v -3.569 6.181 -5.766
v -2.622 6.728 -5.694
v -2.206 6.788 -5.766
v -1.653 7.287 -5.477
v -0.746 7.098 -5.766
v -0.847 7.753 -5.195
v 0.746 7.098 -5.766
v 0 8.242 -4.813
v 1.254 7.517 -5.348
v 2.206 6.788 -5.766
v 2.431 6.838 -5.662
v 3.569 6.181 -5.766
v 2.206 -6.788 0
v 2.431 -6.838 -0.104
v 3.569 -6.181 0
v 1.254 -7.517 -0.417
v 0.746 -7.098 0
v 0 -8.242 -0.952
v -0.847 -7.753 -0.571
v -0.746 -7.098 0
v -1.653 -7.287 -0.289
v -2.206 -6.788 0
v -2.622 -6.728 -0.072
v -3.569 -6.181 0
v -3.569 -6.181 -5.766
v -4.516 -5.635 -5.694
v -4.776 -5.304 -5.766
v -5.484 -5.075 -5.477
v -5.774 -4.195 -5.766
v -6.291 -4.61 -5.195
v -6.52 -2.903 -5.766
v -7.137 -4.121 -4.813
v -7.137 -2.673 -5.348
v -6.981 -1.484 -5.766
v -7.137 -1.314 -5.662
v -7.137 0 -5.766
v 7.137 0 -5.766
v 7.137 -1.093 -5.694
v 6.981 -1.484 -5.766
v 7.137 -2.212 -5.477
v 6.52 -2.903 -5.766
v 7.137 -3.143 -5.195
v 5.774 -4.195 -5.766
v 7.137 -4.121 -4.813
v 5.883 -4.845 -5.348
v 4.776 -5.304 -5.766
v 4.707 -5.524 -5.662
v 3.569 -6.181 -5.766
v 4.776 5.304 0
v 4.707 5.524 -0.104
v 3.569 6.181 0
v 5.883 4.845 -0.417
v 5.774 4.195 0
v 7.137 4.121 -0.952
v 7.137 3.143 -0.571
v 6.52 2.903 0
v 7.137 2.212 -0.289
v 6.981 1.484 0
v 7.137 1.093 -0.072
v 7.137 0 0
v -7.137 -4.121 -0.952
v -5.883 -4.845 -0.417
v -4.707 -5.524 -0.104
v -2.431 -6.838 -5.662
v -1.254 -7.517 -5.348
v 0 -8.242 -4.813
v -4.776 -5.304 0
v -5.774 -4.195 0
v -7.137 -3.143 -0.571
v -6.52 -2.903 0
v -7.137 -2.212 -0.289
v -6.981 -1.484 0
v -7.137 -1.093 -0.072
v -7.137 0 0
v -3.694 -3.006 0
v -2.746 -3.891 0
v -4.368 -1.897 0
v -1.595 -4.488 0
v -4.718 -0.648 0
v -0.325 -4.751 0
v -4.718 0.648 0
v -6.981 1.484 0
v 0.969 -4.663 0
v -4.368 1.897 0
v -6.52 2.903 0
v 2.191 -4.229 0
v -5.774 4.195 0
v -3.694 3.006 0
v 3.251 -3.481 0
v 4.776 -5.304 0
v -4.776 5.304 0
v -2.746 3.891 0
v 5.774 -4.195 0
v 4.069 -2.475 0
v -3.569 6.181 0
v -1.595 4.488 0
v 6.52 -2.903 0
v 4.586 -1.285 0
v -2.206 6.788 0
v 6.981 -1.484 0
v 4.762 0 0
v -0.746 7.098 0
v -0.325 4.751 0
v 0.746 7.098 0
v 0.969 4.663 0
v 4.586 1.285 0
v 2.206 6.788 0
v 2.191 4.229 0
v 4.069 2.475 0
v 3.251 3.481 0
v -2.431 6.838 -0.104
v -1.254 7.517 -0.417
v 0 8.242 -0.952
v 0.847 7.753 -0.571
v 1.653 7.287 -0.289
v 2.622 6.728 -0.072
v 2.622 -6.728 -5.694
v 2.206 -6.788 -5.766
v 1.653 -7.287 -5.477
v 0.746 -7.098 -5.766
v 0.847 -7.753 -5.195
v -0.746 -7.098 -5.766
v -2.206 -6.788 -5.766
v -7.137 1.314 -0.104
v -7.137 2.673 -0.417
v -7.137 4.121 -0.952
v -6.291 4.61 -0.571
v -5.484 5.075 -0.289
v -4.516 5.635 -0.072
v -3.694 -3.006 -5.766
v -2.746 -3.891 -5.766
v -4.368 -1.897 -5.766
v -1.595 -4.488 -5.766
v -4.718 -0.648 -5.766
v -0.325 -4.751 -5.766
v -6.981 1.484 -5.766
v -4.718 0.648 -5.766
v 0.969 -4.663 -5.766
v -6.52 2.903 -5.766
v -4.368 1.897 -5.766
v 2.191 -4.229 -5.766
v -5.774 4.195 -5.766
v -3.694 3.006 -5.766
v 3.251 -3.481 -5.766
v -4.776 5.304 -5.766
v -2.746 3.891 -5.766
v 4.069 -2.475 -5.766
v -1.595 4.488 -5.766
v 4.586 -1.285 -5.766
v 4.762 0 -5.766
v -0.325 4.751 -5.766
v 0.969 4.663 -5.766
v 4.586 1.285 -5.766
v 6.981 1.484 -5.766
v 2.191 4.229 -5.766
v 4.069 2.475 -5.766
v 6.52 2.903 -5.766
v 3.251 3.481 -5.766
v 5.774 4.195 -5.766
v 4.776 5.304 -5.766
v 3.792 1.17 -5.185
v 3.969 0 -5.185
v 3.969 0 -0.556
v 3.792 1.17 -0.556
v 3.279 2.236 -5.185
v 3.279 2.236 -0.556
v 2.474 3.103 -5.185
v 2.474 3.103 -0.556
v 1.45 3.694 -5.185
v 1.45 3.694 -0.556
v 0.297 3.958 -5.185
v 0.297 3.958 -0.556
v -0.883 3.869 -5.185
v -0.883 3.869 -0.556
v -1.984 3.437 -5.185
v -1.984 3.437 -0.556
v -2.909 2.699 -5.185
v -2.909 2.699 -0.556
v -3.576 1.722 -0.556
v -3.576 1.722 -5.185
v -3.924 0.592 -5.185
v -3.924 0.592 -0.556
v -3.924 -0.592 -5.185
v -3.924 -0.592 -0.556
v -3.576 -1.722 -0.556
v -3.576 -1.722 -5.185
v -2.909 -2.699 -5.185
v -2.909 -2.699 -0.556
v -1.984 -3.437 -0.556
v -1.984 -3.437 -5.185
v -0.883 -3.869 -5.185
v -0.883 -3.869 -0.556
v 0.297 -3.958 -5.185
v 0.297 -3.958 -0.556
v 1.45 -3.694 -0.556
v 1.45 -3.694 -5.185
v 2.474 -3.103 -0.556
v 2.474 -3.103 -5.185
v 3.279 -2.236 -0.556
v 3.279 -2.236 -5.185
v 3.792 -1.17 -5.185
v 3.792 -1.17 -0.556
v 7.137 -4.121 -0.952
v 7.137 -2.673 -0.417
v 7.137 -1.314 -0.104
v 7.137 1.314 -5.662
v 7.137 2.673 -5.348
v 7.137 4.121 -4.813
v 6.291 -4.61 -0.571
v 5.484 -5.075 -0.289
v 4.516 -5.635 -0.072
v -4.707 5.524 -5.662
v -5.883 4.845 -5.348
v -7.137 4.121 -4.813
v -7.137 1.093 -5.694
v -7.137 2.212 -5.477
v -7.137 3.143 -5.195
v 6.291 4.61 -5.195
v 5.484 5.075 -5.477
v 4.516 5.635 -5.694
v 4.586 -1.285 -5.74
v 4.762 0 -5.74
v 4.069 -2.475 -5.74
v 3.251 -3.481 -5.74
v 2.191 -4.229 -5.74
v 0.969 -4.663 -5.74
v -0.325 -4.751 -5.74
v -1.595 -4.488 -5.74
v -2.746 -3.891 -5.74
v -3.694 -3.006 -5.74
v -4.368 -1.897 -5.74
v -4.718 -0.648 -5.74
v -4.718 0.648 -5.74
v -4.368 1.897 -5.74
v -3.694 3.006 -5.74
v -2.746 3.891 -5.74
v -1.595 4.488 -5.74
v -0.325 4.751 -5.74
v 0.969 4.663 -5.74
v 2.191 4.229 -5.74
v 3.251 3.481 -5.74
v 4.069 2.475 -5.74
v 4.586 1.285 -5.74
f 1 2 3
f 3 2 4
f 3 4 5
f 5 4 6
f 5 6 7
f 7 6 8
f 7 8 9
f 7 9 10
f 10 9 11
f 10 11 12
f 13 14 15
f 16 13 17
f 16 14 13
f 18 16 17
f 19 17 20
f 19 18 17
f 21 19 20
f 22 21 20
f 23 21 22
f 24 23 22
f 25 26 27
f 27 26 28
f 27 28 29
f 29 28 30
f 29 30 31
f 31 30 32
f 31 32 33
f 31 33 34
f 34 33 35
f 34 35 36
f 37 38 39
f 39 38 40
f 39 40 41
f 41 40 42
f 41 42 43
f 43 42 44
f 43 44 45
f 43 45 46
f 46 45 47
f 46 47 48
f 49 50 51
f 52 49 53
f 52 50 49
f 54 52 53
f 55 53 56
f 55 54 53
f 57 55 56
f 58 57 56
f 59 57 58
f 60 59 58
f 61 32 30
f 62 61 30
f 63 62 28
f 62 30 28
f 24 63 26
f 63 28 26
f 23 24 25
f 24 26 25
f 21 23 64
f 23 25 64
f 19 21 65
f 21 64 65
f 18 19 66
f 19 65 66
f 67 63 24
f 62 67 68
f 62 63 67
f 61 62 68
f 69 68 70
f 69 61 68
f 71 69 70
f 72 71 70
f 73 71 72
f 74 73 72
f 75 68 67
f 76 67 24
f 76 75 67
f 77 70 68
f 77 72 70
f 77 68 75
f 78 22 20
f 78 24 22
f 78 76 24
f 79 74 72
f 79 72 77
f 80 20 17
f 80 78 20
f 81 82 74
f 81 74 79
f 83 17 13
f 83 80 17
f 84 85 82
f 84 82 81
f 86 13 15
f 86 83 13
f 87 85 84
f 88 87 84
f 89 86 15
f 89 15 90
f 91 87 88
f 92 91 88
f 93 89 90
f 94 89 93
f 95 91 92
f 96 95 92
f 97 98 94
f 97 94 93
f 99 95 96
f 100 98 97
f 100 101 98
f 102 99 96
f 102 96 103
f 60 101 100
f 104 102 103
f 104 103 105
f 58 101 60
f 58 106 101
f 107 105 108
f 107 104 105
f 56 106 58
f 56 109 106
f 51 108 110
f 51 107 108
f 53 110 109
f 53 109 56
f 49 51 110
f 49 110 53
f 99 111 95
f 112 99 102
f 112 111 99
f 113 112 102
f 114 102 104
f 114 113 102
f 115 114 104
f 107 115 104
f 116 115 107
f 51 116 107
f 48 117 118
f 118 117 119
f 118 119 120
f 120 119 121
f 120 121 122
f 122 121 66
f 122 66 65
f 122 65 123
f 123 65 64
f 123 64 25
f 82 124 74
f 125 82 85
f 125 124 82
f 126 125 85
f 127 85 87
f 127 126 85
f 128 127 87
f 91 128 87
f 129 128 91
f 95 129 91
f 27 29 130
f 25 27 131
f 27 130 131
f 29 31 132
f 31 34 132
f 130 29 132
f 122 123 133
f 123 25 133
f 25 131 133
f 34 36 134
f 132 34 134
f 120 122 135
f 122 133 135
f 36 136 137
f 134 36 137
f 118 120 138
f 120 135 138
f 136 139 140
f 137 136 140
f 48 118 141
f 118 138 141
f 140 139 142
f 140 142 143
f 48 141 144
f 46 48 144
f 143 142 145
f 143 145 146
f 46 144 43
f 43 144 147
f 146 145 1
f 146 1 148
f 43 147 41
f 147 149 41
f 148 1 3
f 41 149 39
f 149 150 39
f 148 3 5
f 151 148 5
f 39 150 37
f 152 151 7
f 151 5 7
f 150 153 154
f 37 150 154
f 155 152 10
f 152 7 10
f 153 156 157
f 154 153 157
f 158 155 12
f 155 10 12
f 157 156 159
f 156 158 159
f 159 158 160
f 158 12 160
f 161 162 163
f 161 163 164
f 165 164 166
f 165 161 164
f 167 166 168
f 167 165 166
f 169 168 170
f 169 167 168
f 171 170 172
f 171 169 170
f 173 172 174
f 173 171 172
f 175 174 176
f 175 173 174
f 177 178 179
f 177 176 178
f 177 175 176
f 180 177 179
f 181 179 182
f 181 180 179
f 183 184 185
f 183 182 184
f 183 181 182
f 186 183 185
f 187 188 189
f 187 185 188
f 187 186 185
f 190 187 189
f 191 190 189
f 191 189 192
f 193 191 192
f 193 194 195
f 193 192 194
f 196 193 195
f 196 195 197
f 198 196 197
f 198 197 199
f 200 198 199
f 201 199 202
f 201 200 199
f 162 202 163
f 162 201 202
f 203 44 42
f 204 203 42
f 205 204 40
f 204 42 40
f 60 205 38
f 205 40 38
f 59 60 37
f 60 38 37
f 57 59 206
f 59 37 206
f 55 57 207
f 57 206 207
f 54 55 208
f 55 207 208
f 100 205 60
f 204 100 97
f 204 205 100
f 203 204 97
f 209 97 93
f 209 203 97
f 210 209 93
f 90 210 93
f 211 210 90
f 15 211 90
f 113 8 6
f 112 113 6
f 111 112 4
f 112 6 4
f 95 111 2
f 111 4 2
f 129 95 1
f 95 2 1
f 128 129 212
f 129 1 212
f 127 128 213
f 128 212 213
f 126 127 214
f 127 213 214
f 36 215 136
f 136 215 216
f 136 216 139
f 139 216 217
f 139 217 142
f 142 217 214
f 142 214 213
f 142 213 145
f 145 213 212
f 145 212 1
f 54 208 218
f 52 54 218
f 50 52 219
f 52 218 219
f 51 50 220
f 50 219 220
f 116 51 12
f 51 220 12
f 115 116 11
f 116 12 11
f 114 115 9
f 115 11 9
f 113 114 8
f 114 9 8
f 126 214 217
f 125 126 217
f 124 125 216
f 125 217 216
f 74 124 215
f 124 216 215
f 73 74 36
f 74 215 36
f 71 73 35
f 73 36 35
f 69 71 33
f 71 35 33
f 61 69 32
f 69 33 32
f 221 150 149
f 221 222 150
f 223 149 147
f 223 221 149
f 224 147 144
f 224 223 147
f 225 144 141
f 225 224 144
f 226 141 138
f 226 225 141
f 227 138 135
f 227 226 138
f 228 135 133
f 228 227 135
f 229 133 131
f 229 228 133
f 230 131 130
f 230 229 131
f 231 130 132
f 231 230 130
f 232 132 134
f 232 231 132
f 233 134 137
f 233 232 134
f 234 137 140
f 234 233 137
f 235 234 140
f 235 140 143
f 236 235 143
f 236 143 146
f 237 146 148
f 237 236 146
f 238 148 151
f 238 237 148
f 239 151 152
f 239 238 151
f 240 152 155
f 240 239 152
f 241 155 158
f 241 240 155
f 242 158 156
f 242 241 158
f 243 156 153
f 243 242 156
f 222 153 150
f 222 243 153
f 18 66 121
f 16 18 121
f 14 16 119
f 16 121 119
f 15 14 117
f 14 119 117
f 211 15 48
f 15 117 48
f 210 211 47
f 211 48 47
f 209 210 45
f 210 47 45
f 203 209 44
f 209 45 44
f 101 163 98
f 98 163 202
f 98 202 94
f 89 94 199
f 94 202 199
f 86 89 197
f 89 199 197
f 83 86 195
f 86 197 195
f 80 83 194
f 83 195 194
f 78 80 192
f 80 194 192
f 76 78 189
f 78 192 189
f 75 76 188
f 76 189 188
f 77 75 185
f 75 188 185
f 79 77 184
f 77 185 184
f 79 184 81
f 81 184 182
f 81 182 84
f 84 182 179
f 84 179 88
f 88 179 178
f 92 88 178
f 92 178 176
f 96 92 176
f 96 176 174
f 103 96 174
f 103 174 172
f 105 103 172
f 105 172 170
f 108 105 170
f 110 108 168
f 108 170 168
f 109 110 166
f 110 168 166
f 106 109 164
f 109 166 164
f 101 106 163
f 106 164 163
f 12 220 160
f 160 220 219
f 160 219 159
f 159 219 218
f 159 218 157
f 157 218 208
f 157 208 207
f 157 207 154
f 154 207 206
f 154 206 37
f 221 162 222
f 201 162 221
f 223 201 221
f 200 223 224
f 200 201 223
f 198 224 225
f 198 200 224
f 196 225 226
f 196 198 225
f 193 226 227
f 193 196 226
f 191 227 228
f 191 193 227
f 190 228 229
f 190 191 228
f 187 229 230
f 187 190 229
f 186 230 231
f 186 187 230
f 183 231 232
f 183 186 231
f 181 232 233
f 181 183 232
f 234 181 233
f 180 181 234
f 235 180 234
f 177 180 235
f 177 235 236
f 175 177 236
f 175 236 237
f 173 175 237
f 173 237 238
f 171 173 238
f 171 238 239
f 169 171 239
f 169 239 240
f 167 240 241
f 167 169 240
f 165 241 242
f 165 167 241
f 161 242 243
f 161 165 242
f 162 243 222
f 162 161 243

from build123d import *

# Parameters (mm, degrees)
THREADSCHEMATIC_START     = -5.7658
THREADSCHEMATIC_OUTLINE_R = 3.96875
THREADSCHEMATIC_DEPTH     = 5.7658


# Read off the part's stored shape, not the designer's step: ThreadSchematic
with BuildPart() as part:
    # ThreadSchematic outline → ThreadSchematic (new body)
    with BuildSketch(Plane.XY.offset(THREADSCHEMATIC_START)):
        Polygon((7.1374, 4.120779811), (0, 8.241559623), (-7.1374, 4.120779811), (-7.1374, -4.120779811), (0, -8.241559623), (7.1374, -4.120779811), align=None)
        Circle(THREADSCHEMATIC_OUTLINE_R, mode=Mode.SUBTRACT)
    extrude(amount=THREADSCHEMATIC_DEPTH)

    # Sketch3 → Double-Chamfer (revolve, cut)
    with BuildSketch(Plane(origin=(0, 0, 0), x_dir=(0, 0, -1), z_dir=(1, 0, 0))):
        Polygon((5.7658, 7.1374), (4.8133, 8.241559623), (4.8133, 20.941559623), (18.4658, 20.941559623), (18.4658, 7.1374), align=None)
        Polygon((0.9525, 20.941559623), (-12.7, 20.941559623), (-12.7, 7.1374), (0, 7.1374), (0.9525, 8.241559623), align=None)
    revolve(axis=Axis((0, 0, 0), (0, 0, -1)), mode=Mode.SUBTRACT)

    # EndChamferSke → EndChamfer (revolve, cut)
    with BuildSketch(Plane(origin=(0, 0, 0), x_dir=(0, 0, -1), z_dir=(1, 0, 0)), mode=Mode.PRIVATE) as endchamfer_sk:
        Polygon((5.7404, 4.7625), (5.129031293, 3.889375), (5.7912, 3.889375), (5.7912, 4.7625), align=None)
        Polygon((-0.0508, 4.7625), (0, 4.7625), (0.611368707, 3.889375), (-0.0508, 3.889375), align=None)
    revolve(endchamfer_sk.sketch.rotate(Axis((0, 0, -25.037505729), (0, 0, -1)), 90), axis=Axis((0, 0, -25.037505729), (0, 0, -1)), mode=Mode.SUBTRACT)


solid = part.part
